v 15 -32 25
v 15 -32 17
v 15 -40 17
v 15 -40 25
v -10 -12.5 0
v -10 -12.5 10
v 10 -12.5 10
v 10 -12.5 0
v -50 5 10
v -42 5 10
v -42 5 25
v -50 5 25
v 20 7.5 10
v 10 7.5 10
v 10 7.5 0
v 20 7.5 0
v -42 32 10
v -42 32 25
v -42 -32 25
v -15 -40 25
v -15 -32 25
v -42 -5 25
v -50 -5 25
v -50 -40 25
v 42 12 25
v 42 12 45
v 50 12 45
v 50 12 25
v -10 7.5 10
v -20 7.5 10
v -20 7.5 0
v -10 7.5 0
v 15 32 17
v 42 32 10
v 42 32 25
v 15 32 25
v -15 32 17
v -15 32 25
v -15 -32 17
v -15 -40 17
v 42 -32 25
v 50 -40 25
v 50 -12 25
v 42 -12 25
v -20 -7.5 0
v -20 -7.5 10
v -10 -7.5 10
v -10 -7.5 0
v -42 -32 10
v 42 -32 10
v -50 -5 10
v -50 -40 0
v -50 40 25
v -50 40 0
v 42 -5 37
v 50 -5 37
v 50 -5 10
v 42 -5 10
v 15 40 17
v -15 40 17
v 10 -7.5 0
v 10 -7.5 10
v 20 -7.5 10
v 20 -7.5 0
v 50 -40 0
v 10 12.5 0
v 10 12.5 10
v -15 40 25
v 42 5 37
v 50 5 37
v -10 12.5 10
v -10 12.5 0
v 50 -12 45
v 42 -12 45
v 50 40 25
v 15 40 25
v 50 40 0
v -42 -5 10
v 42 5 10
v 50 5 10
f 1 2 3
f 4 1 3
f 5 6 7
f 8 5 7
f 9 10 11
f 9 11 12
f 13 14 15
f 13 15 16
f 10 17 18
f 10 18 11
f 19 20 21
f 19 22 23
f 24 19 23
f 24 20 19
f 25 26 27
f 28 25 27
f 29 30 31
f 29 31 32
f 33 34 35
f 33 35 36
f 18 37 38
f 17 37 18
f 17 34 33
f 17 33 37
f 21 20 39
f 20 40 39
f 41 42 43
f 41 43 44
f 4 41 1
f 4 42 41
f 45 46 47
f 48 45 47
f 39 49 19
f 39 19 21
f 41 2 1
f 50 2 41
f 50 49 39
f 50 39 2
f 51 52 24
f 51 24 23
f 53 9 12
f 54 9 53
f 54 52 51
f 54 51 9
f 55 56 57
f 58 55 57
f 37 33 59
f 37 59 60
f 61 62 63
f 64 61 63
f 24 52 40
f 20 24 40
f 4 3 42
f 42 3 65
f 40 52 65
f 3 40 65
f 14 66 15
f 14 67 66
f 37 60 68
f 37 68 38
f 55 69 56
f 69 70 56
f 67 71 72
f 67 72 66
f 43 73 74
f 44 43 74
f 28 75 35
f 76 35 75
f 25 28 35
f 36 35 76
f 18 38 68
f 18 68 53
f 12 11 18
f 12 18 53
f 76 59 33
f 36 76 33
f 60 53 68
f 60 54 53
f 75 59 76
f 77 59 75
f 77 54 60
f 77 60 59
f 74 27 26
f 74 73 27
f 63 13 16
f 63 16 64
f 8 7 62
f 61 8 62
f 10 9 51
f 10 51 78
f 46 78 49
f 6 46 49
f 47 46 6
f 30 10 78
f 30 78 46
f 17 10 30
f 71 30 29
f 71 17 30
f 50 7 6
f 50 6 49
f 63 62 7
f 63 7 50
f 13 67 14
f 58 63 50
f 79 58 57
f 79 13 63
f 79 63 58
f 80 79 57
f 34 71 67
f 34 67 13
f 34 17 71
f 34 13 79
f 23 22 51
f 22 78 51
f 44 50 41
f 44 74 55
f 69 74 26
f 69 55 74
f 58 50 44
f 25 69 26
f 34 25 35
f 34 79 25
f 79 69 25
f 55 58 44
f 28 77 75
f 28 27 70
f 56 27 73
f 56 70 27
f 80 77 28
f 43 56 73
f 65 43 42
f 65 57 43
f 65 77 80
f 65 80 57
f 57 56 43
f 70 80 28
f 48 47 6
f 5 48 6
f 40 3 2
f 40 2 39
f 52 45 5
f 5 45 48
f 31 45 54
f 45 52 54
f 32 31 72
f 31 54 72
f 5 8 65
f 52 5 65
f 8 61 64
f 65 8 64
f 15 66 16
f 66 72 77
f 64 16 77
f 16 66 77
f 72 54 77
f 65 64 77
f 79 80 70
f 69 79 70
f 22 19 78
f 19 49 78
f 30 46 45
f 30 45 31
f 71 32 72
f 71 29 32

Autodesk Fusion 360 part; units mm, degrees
sketch "Sketch1" plane through (0, 0, 0) normal (0, 1, 0) x (1, 0, 0)
sketch "Sketch2" plane through (0, 0, 0) normal (0, 0, 1) x (1, 0, 0)
  line L0 (50, 0) -> (50, -40)
  line L1 (50, -40) -> (-50, -40)
  line L2 (-50, -40) -> (-50, 40)
  line L3 (-50, 40) -> (50, 40)
  line L4 (50, 40) -> (50, -40)
extrude "Extrude1" add sketch "Sketch2" along normal blind 10
sketch "Sketch3" plane through (0, 0, 10) normal (0, 0, 1) x (-1, 0, 0)
  line L0 (-50, -40) -> (50, -40)
  line L1 (50, -40) -> (50, 40)
  line L2 (50, 40) -> (-50, 40)
  line L3 (-50, 40) -> (-50, -40)
  line L4 (50, 40) -> (15, 40)
  line L5 (15, 40) -> (15, 32)
  line L6 (15, 32) -> (42, 32)
  line L7 (42, 32) -> (42, 5)
  line L8 (42, 5) -> (50, 5)
  line L9 (50, 5) -> (50, 40)
  dimension "d6" = 35
  dimension "d9" = 35
extrude "Extrude2" add sketch "Sketch3" along normal blind 15 contours L1 L2 L4 L5 L6 L7 L8 L9
sketch "Sketch4" plane through (0, 0, 10) normal (0, 0, 1) x (-1, 0, 0)
  line L0 (15, 32) -> (15, 40)
  line L1 (15, 40) -> (-50, 40)
  line L2 (-50, 40) -> (-50, -40)
  line L3 (-50, -40) -> (50, -40)
  line L4 (50, -40) -> (50, 5)
  line L5 (50, 5) -> (42, 5)
  line L6 (42, 5) -> (42, 32)
  line L7 (42, 32) -> (15, 32)
  line L8 (15, 32) -> (-15, 32)
  line L9 (-15, 32) -> (-15, 40)
  line L10 (-15, 40) -> (15, 40)
  line L11 (15, 40) -> (15, 32)
  dimension "d12" = 30
extrude "Extrude3" add sketch "Sketch4" along normal blind 7 contours L0 L1 L8 L9 L10 L11
sketch "Sketch5" plane through (0, 0, 10) normal (0, 0, 1) x (-1, 0, 0)
  line L0 (-15, 32) -> (-15, 40)
  line L1 (-15, 40) -> (-50, 40)
  line L2 (-50, 40) -> (-50, -40)
  line L3 (-50, -40) -> (50, -40)
  line L4 (50, -40) -> (50, 5)
  line L5 (50, 5) -> (42, 5)
  line L6 (42, 5) -> (42, 32)
  line L7 (42, 32) -> (-15, 32)
  line L8 (-15, 32) -> (-42, 32)
  line L9 (-50, 40) -> (-15, 40)
  line L10 (-15, 40) -> (-15, 32)
  line L11 (-42, 32) -> (-42, 12)
  line L12 (-42, 12) -> (-50, 12)
  line L13 (-50, 12) -> (-50, 40)
  dimension "d16" = 28
extrude "Extrude4" add sketch "Sketch5" along normal blind 15 contours L0 L1 L2 L8 L9 L10 L11 L12 L13
sketch "Sketch6" plane through (0, 0, 10) normal (0, 0, 1) x (-1, 0, 0)
  line L0 (-42, 12) -> (-50, 12)
  line L1 (-50, 12) -> (-50, -40)
  line L2 (-50, -40) -> (50, -40)
  line L3 (50, -40) -> (50, 5)
  line L4 (50, 5) -> (42, 5)
  line L5 (42, 5) -> (42, 32)
  line L6 (42, 32) -> (-42, 32)
  line L7 (-42, 32) -> (-42, 12)
  line L8 (42, -32) -> (42, -5)
  line L9 (42, -5) -> (50, -5)
  line L10 (50, -5) -> (50, -40)
  line L11 (50, -40) -> (15, -40)
  line L12 (15, -40) -> (15, -32)
  line L13 (15, -32) -> (42, -32)
  dimension "d19" = 35
  dimension "d20" = 35
sketch "Sketch7" plane through (0, 0, 10) normal (0, 0, 1) x (-1, 0, 0)
  line L0 (-50, -40) -> (-42, -40)
  line L1 (-42, -32) -> (-42, -12)
  line L2 (-42, -12) -> (-50, -12)
  line L3 (-50, -12) -> (-50, -40)
  line L4 (-50, -40) -> (-15, -40)
  line L5 (-15, -40) -> (-15, -32)
  line L6 (-15, -32) -> (-42, -32)
  line L7 (-50, -32) -> (-50, -40)
  dimension "d22" = 8
  dimension "d23" = 28
  dimension "d24" = 35
  dimension "d25" = 8
extrude "Extrude5" add sketch "Sketch7" sketch "Sketch6" along normal blind 15 of sketch 2 contours L2 L3 L8 L9 L10 L11 L12 L13
sketch "Sketch8" plane through (0, 0, 10) normal (0, 0, 1) x (-1, 0, 0)
  line L0 (42, -5) -> (50, -5)
  line L1 (50, -5) -> (50, 5)
  line L2 (50, 5) -> (42, 5)
  line L3 (42, 5) -> (42, 32)
  line L4 (42, 32) -> (-42, 32)
  line L5 (-42, 32) -> (-42, 12)
  line L6 (-42, 12) -> (-50, 12)
  line L7 (-50, 12) -> (-50, -12)
  line L8 (-50, -12) -> (-42, -12)
  line L9 (-42, -12) -> (-42, -32)
  line L10 (-42, -32) -> (-15, -32)
  line L11 (-15, -32) -> (-15, -40)
  line L12 (-15, -40) -> (15, -40)
  line L13 (15, -40) -> (15, -32)
  line L14 (15, -32) -> (42, -32)
  line L15 (42, -32) -> (42, -5)
sketch "Sketch9" plane through (0, 0, 25) normal (0, 0, 1) x (-1, 0, 0)
  line L0 (-50, 12) -> (-42, 12)
  line L1 (-42, 12) -> (-42, 32)
  line L2 (-42, 32) -> (-15, 32)
  line L3 (-15, 32) -> (-15, 40)
  line L4 (-15, 40) -> (-50, 40)
  line L5 (-50, 40) -> (-50, 12)
sketch "Sketch10" plane through (0, 0, 10) normal (0, 0, 1) x (-1, 0, 0)
  line L0 (-50, 12) -> (-42, 12)
  line L1 (-42, 12) -> (-42, -12)
  line L2 (-42, -12) -> (-50, -12)
  line L3 (-50, -12) -> (-50, 12)
extrude "Extrude6" add sketch "Sketch10" along normal blind 35
sketch "Sketch11" plane through (0, 0, 10) normal (0, 0, 1) x (-1, 0, 0)
sketch "Sketch12" plane through (50, 0, 0) normal (1, 0, 0) x (0, 1, 0)
  line L0 (-40, 0) -> (40, 0)
  line L1 (40, 0) -> (40, 25)
  line L2 (40, 25) -> (12, 25)
  line L3 (12, 25) -> (12, 45)
  line L4 (12, 45) -> (-12, 45)
  line L5 (-12, 45) -> (-12, 25)
  line L6 (-12, 25) -> (-40, 25)
  line L7 (-40, 25) -> (-40, 0)
ref_plane "WorkPlane1" through (50, -12, 45) normal (1, 0, 0) x (0, 1, 0)
sketch "Sketch13" plane through (50, 0, 0) normal (1, 0, 0) x (0, 1, 0)
  line L0 (0, 37) -> (5, 37)
  line L1 (5, 37) -> (-5, 37)
  line L2 (-5, 37) -> (-5, 10)
  line L3 (-5, 10) -> (5, 10)
  line L4 (5, 10) -> (5, 37)
  dimension "d31" = 5
  dimension "d32" = 27
extrude "Extrude7" cut sketch "Sketch13" against normal blind 200
sketch "Sketch14" plane through (0, 0, 10) normal (0, 0, 1) x (-1, 0, 0)
  line L0 (-20, 0) -> (-20, 7.5)
  line L1 (20, 0) -> (20, -7.5)
  line L2 (-20, -7.5) -> (-20, 0)
  line L3 (10, -7.5) -> (10, -12.5)
  line L4 (10, -12.5) -> (-10, -12.5)
  line L5 (-10, -12.5) -> (-10, -7.5)
  line L6 (20, -7.5) -> (10, -7.5)
  line L7 (-10, -7.5) -> (-20, -7.5)
  line L8 (10, 12.5) -> (-10, 12.5)
  line L9 (10, 7.5) -> (10, 12.5)
  line L10 (20, 7.5) -> (10, 7.5)
  line L11 (20, 0) -> (20, 7.5)
  line L12 (-10, 12.5) -> (-10, 7.5)
  line L13 (-10, 7.5) -> (-20, 7.5)
  line L14 (-20, 7.5) -> (-20, 0)
  dimension "d35" = 20
  dimension "d36" = 7.5
  dimension "d37" = 15
  dimension "d40" = 20
  dimension "d41" = 5
extrude "Extrude8" cut sketch "Sketch14" against normal blind 100
sketch "Sketch15" plane through (0, -40, 0) normal (0, -1, 0) x (1, 0, 0)
  line L0 (-50, 0) -> (50, 0)
  line L1 (50, 0) -> (50, 25)
  line L2 (50, 25) -> (15, 25)
  line L3 (15, 25) -> (15, 17)
  line L4 (15, 17) -> (-15, 17)
  line L5 (-15, 17) -> (-15, 25)
  line L6 (-15, 25) -> (-50, 25)
  line L7 (-50, 25) -> (-50, 0)
sketch "Sketch16" plane through (0, 0, 10) normal (0, 0, 1) x (-1, 0, 0)
sketch "Sketch17" plane through (0, 0, 10) normal (0, 0, 1) x (-1, 0, 0)
  line L0 (-15, -32) -> (15, -32)
  line L1 (15, -32) -> (15, -40)
  line L2 (15, -40) -> (-15, -40)
  line L3 (-15, -40) -> (-15, -32)
extrude "Extrude9" add sketch "Sketch17" along normal blind 7
